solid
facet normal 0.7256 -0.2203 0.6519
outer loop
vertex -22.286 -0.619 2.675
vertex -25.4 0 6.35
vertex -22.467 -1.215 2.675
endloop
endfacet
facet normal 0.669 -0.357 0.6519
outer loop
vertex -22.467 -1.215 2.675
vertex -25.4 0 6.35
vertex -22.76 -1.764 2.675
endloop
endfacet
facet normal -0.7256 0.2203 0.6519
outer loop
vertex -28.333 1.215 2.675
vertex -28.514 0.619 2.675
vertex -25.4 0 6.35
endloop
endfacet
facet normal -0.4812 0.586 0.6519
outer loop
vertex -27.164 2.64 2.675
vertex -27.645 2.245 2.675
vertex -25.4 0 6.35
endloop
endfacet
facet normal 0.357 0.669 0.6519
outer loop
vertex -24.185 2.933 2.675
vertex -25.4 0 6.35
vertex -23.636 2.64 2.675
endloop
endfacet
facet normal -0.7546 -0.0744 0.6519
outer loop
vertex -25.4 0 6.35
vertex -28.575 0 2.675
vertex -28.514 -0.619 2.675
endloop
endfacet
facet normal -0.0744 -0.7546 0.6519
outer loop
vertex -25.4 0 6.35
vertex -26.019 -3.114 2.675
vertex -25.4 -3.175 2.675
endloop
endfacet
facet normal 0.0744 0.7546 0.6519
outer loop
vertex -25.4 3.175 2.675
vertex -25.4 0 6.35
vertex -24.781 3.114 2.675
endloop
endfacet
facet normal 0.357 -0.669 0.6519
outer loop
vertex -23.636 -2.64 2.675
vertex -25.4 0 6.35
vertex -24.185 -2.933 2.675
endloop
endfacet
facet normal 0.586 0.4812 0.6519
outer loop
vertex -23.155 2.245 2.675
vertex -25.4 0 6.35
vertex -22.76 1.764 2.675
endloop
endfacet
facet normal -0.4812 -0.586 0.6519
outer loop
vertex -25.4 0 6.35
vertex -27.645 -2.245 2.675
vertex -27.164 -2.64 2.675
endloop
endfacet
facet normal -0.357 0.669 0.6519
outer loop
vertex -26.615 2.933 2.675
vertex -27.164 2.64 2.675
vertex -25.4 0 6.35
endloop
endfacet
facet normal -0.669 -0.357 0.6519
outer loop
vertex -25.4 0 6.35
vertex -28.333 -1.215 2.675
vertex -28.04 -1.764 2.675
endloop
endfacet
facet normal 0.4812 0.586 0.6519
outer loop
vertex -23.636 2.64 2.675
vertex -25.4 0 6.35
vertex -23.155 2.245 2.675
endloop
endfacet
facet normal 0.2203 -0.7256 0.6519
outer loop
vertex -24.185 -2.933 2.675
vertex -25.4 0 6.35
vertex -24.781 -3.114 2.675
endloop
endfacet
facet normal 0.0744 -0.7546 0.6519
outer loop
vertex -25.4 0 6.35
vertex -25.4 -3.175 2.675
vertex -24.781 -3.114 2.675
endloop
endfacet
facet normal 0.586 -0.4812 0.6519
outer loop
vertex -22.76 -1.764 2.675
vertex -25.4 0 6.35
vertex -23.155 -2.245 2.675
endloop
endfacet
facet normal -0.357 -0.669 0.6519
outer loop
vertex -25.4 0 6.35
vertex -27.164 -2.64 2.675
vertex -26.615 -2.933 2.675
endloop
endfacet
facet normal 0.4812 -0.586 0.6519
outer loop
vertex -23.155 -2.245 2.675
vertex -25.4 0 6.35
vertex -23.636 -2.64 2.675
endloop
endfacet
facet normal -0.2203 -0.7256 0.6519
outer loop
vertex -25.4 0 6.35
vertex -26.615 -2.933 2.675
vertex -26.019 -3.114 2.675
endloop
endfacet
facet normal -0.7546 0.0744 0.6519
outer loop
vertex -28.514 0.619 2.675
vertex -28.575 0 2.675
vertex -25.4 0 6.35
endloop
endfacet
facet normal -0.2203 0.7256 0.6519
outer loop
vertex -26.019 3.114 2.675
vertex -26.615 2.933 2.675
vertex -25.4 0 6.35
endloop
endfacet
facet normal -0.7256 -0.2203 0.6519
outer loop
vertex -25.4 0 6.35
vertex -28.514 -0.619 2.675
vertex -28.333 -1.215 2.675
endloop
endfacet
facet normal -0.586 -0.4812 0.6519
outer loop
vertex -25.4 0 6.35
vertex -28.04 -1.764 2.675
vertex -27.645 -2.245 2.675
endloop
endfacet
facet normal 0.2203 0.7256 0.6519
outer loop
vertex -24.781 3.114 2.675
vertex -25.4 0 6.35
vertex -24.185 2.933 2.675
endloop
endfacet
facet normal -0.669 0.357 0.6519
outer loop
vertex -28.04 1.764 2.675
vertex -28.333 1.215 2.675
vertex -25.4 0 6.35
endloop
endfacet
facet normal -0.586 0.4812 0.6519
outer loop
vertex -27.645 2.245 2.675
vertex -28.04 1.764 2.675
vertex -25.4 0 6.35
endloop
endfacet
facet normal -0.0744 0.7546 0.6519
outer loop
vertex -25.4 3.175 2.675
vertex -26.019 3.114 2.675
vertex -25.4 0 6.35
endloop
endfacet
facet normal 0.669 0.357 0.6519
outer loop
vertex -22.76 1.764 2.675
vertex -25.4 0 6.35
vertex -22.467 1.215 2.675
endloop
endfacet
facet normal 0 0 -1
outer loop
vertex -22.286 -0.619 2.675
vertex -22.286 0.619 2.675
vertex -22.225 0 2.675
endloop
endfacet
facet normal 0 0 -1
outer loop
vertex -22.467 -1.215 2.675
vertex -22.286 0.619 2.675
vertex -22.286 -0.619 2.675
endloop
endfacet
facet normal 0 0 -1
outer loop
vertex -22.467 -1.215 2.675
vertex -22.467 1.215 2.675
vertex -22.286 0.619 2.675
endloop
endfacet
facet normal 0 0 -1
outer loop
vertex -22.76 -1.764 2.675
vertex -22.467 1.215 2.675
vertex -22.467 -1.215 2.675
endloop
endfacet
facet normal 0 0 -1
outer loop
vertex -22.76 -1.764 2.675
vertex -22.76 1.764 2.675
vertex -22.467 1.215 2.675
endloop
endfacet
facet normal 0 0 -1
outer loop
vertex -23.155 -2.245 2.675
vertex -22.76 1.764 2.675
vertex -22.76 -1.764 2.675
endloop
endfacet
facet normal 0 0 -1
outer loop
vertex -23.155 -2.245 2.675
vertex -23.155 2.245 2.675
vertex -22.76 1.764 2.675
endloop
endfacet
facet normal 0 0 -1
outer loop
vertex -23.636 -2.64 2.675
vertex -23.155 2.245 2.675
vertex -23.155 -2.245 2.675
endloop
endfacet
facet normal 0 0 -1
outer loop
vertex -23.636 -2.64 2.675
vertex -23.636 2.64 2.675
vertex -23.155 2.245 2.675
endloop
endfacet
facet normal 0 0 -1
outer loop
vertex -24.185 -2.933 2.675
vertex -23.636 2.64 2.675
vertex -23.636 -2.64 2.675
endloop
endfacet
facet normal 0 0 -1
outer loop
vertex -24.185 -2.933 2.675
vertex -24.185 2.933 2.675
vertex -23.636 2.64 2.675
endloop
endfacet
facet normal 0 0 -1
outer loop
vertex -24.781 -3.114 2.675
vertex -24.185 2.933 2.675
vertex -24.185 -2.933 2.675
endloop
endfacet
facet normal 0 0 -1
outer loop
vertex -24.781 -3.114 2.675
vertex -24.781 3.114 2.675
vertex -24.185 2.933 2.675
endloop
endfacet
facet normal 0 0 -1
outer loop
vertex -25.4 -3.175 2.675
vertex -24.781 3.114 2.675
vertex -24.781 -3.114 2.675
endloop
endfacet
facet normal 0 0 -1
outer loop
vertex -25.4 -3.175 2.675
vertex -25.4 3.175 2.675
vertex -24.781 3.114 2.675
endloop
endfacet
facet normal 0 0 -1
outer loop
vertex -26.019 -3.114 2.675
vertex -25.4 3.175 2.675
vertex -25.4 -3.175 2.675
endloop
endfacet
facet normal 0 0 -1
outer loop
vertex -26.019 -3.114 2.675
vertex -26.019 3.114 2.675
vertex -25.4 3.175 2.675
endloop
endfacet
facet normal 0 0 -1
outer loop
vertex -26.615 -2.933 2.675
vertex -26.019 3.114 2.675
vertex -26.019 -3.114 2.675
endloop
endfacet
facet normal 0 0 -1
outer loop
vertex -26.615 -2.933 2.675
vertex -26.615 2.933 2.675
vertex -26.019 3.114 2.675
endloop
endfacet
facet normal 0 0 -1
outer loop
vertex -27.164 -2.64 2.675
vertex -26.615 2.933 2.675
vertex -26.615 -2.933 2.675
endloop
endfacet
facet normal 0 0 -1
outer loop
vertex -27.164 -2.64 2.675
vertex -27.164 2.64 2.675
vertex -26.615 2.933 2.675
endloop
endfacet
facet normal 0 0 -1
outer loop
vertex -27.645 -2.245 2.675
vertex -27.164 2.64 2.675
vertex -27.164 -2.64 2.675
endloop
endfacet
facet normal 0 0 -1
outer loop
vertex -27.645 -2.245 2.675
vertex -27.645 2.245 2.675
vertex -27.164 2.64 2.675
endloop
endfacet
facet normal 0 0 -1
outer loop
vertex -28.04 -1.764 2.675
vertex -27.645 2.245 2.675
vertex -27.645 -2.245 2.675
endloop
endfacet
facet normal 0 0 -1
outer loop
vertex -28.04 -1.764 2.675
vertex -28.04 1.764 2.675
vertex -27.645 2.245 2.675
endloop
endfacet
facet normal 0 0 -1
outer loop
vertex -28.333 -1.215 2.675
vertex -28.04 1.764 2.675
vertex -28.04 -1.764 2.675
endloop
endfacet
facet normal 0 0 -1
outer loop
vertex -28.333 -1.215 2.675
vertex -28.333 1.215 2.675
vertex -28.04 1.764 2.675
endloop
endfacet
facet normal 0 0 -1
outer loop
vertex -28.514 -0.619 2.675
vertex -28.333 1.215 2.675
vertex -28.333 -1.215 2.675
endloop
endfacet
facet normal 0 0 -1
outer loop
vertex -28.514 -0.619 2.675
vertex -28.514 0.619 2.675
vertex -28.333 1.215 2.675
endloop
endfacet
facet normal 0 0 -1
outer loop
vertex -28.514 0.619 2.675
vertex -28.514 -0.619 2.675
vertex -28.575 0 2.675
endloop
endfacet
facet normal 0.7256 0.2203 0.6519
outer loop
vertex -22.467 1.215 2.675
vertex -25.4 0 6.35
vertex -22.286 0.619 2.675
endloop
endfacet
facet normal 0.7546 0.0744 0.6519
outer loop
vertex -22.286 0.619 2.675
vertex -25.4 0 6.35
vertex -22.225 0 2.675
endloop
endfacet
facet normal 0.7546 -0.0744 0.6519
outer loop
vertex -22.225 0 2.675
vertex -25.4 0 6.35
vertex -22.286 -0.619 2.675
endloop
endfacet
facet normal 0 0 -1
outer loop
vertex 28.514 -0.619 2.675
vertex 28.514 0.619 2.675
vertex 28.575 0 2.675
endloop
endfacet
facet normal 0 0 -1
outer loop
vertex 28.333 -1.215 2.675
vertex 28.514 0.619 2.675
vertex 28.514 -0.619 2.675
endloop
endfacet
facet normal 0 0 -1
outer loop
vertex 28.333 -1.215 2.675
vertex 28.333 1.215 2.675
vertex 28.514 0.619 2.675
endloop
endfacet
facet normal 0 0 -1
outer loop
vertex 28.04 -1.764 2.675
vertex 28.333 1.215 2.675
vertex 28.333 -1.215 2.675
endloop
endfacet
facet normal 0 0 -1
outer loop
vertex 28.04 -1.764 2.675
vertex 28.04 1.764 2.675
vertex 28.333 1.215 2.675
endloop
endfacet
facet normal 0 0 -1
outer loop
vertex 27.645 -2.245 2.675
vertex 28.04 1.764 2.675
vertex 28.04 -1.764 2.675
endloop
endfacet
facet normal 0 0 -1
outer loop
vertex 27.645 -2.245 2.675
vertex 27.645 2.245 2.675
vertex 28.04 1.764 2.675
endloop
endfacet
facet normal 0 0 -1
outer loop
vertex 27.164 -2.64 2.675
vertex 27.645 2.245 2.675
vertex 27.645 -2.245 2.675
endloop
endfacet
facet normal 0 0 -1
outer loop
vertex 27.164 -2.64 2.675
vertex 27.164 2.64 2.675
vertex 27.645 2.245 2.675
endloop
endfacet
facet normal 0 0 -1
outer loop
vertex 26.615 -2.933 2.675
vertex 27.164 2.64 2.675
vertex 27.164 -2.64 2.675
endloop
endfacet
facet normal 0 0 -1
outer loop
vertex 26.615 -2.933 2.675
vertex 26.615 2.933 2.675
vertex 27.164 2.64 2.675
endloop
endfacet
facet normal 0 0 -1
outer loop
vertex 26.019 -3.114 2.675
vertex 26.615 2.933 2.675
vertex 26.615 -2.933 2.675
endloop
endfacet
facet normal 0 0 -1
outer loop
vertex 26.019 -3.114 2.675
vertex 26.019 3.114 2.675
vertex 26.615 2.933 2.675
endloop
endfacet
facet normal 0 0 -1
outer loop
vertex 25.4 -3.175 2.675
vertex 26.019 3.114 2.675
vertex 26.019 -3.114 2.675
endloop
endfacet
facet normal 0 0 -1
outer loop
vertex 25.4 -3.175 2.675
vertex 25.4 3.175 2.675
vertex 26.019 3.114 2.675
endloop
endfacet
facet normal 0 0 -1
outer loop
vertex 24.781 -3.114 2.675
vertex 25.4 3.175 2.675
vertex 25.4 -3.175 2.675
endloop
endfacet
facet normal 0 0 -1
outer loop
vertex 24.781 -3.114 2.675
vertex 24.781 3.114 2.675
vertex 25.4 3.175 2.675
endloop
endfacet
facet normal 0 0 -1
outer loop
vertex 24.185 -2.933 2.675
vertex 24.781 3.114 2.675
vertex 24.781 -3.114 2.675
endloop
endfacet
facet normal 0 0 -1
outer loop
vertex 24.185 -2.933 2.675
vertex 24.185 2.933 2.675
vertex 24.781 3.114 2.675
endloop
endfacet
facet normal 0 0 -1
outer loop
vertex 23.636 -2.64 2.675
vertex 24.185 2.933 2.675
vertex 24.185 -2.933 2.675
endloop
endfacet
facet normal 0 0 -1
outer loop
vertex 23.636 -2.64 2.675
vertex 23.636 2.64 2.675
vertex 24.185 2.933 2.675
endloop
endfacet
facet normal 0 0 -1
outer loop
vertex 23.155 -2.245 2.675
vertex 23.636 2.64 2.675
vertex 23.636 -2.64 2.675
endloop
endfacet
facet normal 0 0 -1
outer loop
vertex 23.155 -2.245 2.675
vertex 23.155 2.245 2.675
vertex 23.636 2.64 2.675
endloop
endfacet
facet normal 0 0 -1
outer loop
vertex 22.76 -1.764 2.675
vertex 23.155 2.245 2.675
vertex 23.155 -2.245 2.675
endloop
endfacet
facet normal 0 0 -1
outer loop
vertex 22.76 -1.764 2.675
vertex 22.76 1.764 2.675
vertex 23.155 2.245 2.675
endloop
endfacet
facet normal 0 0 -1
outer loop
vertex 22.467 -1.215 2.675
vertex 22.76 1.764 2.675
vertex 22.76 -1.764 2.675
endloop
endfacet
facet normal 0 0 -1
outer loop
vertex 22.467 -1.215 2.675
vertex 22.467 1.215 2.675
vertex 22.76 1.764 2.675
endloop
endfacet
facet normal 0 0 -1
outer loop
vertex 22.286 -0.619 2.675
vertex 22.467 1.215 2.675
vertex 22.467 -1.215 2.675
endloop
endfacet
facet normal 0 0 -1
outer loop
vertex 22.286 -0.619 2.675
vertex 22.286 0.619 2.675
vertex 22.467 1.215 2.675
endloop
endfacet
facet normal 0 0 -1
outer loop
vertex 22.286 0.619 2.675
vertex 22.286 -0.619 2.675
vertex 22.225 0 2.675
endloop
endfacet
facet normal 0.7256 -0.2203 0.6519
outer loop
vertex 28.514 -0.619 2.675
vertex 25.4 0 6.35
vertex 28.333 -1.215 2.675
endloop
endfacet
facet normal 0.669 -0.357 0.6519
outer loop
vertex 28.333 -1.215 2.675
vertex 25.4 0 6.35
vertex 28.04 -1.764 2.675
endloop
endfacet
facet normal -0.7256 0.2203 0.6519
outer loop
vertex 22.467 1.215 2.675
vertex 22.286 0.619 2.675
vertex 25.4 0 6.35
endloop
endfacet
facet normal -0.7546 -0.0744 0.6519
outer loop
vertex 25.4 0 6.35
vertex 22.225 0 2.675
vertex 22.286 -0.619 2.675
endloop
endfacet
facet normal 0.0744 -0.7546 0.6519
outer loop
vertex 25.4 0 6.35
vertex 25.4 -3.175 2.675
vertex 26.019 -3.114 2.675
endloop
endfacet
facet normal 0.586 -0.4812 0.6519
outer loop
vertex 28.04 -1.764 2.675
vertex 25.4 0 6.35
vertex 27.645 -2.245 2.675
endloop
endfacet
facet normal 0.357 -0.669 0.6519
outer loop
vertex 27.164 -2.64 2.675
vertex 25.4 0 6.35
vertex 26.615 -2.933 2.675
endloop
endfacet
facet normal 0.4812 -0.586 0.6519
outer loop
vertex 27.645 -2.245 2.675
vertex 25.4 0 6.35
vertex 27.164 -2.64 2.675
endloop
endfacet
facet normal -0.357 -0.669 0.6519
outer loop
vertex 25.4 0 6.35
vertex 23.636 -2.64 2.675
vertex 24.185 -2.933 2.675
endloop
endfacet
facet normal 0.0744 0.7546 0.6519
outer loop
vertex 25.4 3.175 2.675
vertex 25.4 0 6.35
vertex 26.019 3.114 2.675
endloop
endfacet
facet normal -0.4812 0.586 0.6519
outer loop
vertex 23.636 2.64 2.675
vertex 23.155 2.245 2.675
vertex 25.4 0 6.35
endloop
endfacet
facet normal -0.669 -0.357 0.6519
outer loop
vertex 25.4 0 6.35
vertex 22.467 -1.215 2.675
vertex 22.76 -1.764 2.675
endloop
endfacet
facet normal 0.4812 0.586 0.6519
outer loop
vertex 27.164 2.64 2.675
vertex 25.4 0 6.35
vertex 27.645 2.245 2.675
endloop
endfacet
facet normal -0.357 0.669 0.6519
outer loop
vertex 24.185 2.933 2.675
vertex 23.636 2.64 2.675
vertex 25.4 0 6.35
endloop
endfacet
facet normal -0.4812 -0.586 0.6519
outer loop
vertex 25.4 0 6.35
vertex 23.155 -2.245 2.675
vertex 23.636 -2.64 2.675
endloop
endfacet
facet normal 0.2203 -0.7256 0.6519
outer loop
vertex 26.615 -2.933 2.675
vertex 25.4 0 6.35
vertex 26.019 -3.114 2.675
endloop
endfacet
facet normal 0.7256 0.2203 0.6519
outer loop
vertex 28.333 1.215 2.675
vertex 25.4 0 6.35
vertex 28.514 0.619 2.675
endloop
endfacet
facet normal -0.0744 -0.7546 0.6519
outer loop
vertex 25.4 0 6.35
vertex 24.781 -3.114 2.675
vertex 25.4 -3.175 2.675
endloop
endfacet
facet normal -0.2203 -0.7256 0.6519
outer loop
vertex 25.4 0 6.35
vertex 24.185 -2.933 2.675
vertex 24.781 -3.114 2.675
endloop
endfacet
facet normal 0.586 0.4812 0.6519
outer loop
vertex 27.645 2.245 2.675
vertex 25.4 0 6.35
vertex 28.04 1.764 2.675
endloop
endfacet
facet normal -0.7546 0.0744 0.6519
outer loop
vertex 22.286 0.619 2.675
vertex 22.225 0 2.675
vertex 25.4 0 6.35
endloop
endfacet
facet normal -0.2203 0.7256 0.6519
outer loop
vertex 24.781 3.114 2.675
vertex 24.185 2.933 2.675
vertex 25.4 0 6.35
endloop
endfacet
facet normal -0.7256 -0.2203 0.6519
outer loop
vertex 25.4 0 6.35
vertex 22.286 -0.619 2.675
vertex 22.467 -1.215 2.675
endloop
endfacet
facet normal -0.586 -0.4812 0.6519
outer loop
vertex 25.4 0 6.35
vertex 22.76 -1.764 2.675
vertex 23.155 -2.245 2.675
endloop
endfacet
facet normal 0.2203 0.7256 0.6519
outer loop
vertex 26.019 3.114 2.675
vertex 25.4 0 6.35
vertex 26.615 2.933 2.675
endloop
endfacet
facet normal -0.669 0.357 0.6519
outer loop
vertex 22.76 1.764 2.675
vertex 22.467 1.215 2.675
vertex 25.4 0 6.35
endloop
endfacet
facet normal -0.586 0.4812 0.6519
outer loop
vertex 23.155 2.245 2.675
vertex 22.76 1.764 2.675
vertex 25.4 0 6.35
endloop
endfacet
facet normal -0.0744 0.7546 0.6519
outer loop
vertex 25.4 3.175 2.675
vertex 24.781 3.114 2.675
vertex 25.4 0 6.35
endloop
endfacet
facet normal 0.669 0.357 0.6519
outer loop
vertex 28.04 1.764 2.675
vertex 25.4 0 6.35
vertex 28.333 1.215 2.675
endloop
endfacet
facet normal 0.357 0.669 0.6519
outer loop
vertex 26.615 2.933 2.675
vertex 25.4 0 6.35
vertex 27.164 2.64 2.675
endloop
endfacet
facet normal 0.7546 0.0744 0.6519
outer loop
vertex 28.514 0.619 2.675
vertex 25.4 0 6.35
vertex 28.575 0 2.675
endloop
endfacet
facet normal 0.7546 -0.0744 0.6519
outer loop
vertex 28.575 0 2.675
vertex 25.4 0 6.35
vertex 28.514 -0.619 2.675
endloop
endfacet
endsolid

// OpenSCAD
// OvalNut0.1
// 
// tog-scad-options: requires=csg-engine:manifold
//
// An oval-shaped nut that might be slipped through a hole
// only to be turned and affixed behind that hole,
// like maybe a 1+1/2" hole in some drywall,
// providing a slightly smaller but threaded hole,
// like a 1+1/4"-7 one.
// 
// OpenSCAD 2021 messes up the threaded hole subtraction.
// Use OpenSCAD 2024 with the manifold engine.

width  = "2.5inch";
height = "1.5inch";
thickness = "1/4inch";
edge_rounding_radius = "3/4inch";

inner_threads = "1+1/4-7-UNC";
// Maybe could/should be derived from inner_threads:
inner_hole_nominal_diameter = "1+1/4inch";
inner_thread_radius_offset = "0.2mm";
tape_groove_width = "14mm";

spike_height = "1/8inch";

$fn = 32;

module __ovalnut0__end_params() { }

use <../lib/TOGMod1.scad>
use <../lib/TOGMod1Constructors.scad>
use <../lib/TOGPolyhedronLib1.scad>
use <../lib/TOGThreads2.scad>
use <../lib/TOGUnits1.scad>
use <../lib/TOGPath1.scad>

width_mm  = togunits1_to_mm(width);
height_mm = togunits1_to_mm(height);
thickness_mm                   = togunits1_to_mm(thickness);
edge_rounding_radius_mm        = togunits1_to_mm(edge_rounding_radius);
inner_hole_nominal_diameter_mm = togunits1_to_mm(inner_hole_nominal_diameter);
tape_groove_width_mm           = togunits1_to_mm(tape_groove_width);
spike_height_mm                = togunits1_to_mm(spike_height);
inner_thread_radius_offset_mm  = togunits1_to_mm(inner_thread_radius_offset);

togmod1_domodule(
	let( spike = spike_height_mm <= 0 ? ["union"] : tphl1_make_z_cylinder(zds=[[-0.5, spike_height_mm*2], [spike_height_mm, 0]]) )
	/* Hardcoded dimensions version:
	let( tape_groove = togmod1_linear_extrude_x([-7, 7], ["difference",
		togmod1_make_rect([19.05, 19.05]),
		["intersection",
			togmod1_make_rect([6, 100]),
			togmod1_make_circle(r=4)
		],
	]) )
	*/
	let( edge_thickness = (height_mm-inner_hole_nominal_diameter_mm)/2 )
	let( tape_groove = tape_groove_width_mm <= 0 ? ["union"] : togmod1_linear_extrude_x([-tape_groove_width_mm/2, tape_groove_width_mm/2], ["difference",
		togmod1_make_rect([edge_thickness*4, edge_thickness*4]),
		["intersection",
			togmod1_make_rect([edge_thickness*2, 100]),
			togmod1_make_circle(r=edge_thickness*1.2)
		],
	]) )
	["difference",
		["union",
			let( edgeang = 2*asin(thickness_mm/2 / edge_rounding_radius_mm) )
			let( edgefn = max(12, $fn*edgeang/360) )
			let( outer_rath = togpath1_make_rectangle_rath([width_mm, height_mm], corner_ops=[["round",min(width_mm,height_mm)/2]]) )
			let( pentedge_ang         = (edgefn/2-1)*edgeang/edgefn )
			tphl1_make_polyhedron_from_layer_function(
				[for(i=[-edgefn/2:1:edgefn/2])
					let( ang         = i*edgeang/edgefn )
					let( rounded_off = (cos(         ang) - 1) * edge_rounding_radius_mm )
					let( beveled_off = (cos(pentedge_ang) - 1) * edge_rounding_radius_mm - edge_rounding_radius_mm*sin(edgeang/edgefn) )
					[
						sin(ang) * edge_rounding_radius_mm,
						i == (-edgefn/2) || i == (edgefn/2) ? beveled_off : rounded_off
					]
				],
				function(zo) togpath1_rath_to_polypoints(
					togpath1_offset_rath(outer_rath, zo[1])
				),
				layer_points_transform = "key0-to-z"
			),
			
			for( pos=[[-width_mm/2+spike_height_mm*2,0], [width_mm/2-spike_height_mm*2,0]] )
			["translate", [pos[0],pos[1],thickness_mm/2], spike],
		],
		
		togthreads2_make_threads(
			togthreads2_simple_zparams([[-thickness_mm/2, 1], [thickness_mm/2, 1]], taper_length=0.5, inset=0.5, extend=1),
			inner_threads,
			r_offset = inner_thread_radius_offset_mm
		),
		
		for( ym=[-1,1] )
		["translate", [0,ym*height_mm/2,0], tape_groove]
	]
);
